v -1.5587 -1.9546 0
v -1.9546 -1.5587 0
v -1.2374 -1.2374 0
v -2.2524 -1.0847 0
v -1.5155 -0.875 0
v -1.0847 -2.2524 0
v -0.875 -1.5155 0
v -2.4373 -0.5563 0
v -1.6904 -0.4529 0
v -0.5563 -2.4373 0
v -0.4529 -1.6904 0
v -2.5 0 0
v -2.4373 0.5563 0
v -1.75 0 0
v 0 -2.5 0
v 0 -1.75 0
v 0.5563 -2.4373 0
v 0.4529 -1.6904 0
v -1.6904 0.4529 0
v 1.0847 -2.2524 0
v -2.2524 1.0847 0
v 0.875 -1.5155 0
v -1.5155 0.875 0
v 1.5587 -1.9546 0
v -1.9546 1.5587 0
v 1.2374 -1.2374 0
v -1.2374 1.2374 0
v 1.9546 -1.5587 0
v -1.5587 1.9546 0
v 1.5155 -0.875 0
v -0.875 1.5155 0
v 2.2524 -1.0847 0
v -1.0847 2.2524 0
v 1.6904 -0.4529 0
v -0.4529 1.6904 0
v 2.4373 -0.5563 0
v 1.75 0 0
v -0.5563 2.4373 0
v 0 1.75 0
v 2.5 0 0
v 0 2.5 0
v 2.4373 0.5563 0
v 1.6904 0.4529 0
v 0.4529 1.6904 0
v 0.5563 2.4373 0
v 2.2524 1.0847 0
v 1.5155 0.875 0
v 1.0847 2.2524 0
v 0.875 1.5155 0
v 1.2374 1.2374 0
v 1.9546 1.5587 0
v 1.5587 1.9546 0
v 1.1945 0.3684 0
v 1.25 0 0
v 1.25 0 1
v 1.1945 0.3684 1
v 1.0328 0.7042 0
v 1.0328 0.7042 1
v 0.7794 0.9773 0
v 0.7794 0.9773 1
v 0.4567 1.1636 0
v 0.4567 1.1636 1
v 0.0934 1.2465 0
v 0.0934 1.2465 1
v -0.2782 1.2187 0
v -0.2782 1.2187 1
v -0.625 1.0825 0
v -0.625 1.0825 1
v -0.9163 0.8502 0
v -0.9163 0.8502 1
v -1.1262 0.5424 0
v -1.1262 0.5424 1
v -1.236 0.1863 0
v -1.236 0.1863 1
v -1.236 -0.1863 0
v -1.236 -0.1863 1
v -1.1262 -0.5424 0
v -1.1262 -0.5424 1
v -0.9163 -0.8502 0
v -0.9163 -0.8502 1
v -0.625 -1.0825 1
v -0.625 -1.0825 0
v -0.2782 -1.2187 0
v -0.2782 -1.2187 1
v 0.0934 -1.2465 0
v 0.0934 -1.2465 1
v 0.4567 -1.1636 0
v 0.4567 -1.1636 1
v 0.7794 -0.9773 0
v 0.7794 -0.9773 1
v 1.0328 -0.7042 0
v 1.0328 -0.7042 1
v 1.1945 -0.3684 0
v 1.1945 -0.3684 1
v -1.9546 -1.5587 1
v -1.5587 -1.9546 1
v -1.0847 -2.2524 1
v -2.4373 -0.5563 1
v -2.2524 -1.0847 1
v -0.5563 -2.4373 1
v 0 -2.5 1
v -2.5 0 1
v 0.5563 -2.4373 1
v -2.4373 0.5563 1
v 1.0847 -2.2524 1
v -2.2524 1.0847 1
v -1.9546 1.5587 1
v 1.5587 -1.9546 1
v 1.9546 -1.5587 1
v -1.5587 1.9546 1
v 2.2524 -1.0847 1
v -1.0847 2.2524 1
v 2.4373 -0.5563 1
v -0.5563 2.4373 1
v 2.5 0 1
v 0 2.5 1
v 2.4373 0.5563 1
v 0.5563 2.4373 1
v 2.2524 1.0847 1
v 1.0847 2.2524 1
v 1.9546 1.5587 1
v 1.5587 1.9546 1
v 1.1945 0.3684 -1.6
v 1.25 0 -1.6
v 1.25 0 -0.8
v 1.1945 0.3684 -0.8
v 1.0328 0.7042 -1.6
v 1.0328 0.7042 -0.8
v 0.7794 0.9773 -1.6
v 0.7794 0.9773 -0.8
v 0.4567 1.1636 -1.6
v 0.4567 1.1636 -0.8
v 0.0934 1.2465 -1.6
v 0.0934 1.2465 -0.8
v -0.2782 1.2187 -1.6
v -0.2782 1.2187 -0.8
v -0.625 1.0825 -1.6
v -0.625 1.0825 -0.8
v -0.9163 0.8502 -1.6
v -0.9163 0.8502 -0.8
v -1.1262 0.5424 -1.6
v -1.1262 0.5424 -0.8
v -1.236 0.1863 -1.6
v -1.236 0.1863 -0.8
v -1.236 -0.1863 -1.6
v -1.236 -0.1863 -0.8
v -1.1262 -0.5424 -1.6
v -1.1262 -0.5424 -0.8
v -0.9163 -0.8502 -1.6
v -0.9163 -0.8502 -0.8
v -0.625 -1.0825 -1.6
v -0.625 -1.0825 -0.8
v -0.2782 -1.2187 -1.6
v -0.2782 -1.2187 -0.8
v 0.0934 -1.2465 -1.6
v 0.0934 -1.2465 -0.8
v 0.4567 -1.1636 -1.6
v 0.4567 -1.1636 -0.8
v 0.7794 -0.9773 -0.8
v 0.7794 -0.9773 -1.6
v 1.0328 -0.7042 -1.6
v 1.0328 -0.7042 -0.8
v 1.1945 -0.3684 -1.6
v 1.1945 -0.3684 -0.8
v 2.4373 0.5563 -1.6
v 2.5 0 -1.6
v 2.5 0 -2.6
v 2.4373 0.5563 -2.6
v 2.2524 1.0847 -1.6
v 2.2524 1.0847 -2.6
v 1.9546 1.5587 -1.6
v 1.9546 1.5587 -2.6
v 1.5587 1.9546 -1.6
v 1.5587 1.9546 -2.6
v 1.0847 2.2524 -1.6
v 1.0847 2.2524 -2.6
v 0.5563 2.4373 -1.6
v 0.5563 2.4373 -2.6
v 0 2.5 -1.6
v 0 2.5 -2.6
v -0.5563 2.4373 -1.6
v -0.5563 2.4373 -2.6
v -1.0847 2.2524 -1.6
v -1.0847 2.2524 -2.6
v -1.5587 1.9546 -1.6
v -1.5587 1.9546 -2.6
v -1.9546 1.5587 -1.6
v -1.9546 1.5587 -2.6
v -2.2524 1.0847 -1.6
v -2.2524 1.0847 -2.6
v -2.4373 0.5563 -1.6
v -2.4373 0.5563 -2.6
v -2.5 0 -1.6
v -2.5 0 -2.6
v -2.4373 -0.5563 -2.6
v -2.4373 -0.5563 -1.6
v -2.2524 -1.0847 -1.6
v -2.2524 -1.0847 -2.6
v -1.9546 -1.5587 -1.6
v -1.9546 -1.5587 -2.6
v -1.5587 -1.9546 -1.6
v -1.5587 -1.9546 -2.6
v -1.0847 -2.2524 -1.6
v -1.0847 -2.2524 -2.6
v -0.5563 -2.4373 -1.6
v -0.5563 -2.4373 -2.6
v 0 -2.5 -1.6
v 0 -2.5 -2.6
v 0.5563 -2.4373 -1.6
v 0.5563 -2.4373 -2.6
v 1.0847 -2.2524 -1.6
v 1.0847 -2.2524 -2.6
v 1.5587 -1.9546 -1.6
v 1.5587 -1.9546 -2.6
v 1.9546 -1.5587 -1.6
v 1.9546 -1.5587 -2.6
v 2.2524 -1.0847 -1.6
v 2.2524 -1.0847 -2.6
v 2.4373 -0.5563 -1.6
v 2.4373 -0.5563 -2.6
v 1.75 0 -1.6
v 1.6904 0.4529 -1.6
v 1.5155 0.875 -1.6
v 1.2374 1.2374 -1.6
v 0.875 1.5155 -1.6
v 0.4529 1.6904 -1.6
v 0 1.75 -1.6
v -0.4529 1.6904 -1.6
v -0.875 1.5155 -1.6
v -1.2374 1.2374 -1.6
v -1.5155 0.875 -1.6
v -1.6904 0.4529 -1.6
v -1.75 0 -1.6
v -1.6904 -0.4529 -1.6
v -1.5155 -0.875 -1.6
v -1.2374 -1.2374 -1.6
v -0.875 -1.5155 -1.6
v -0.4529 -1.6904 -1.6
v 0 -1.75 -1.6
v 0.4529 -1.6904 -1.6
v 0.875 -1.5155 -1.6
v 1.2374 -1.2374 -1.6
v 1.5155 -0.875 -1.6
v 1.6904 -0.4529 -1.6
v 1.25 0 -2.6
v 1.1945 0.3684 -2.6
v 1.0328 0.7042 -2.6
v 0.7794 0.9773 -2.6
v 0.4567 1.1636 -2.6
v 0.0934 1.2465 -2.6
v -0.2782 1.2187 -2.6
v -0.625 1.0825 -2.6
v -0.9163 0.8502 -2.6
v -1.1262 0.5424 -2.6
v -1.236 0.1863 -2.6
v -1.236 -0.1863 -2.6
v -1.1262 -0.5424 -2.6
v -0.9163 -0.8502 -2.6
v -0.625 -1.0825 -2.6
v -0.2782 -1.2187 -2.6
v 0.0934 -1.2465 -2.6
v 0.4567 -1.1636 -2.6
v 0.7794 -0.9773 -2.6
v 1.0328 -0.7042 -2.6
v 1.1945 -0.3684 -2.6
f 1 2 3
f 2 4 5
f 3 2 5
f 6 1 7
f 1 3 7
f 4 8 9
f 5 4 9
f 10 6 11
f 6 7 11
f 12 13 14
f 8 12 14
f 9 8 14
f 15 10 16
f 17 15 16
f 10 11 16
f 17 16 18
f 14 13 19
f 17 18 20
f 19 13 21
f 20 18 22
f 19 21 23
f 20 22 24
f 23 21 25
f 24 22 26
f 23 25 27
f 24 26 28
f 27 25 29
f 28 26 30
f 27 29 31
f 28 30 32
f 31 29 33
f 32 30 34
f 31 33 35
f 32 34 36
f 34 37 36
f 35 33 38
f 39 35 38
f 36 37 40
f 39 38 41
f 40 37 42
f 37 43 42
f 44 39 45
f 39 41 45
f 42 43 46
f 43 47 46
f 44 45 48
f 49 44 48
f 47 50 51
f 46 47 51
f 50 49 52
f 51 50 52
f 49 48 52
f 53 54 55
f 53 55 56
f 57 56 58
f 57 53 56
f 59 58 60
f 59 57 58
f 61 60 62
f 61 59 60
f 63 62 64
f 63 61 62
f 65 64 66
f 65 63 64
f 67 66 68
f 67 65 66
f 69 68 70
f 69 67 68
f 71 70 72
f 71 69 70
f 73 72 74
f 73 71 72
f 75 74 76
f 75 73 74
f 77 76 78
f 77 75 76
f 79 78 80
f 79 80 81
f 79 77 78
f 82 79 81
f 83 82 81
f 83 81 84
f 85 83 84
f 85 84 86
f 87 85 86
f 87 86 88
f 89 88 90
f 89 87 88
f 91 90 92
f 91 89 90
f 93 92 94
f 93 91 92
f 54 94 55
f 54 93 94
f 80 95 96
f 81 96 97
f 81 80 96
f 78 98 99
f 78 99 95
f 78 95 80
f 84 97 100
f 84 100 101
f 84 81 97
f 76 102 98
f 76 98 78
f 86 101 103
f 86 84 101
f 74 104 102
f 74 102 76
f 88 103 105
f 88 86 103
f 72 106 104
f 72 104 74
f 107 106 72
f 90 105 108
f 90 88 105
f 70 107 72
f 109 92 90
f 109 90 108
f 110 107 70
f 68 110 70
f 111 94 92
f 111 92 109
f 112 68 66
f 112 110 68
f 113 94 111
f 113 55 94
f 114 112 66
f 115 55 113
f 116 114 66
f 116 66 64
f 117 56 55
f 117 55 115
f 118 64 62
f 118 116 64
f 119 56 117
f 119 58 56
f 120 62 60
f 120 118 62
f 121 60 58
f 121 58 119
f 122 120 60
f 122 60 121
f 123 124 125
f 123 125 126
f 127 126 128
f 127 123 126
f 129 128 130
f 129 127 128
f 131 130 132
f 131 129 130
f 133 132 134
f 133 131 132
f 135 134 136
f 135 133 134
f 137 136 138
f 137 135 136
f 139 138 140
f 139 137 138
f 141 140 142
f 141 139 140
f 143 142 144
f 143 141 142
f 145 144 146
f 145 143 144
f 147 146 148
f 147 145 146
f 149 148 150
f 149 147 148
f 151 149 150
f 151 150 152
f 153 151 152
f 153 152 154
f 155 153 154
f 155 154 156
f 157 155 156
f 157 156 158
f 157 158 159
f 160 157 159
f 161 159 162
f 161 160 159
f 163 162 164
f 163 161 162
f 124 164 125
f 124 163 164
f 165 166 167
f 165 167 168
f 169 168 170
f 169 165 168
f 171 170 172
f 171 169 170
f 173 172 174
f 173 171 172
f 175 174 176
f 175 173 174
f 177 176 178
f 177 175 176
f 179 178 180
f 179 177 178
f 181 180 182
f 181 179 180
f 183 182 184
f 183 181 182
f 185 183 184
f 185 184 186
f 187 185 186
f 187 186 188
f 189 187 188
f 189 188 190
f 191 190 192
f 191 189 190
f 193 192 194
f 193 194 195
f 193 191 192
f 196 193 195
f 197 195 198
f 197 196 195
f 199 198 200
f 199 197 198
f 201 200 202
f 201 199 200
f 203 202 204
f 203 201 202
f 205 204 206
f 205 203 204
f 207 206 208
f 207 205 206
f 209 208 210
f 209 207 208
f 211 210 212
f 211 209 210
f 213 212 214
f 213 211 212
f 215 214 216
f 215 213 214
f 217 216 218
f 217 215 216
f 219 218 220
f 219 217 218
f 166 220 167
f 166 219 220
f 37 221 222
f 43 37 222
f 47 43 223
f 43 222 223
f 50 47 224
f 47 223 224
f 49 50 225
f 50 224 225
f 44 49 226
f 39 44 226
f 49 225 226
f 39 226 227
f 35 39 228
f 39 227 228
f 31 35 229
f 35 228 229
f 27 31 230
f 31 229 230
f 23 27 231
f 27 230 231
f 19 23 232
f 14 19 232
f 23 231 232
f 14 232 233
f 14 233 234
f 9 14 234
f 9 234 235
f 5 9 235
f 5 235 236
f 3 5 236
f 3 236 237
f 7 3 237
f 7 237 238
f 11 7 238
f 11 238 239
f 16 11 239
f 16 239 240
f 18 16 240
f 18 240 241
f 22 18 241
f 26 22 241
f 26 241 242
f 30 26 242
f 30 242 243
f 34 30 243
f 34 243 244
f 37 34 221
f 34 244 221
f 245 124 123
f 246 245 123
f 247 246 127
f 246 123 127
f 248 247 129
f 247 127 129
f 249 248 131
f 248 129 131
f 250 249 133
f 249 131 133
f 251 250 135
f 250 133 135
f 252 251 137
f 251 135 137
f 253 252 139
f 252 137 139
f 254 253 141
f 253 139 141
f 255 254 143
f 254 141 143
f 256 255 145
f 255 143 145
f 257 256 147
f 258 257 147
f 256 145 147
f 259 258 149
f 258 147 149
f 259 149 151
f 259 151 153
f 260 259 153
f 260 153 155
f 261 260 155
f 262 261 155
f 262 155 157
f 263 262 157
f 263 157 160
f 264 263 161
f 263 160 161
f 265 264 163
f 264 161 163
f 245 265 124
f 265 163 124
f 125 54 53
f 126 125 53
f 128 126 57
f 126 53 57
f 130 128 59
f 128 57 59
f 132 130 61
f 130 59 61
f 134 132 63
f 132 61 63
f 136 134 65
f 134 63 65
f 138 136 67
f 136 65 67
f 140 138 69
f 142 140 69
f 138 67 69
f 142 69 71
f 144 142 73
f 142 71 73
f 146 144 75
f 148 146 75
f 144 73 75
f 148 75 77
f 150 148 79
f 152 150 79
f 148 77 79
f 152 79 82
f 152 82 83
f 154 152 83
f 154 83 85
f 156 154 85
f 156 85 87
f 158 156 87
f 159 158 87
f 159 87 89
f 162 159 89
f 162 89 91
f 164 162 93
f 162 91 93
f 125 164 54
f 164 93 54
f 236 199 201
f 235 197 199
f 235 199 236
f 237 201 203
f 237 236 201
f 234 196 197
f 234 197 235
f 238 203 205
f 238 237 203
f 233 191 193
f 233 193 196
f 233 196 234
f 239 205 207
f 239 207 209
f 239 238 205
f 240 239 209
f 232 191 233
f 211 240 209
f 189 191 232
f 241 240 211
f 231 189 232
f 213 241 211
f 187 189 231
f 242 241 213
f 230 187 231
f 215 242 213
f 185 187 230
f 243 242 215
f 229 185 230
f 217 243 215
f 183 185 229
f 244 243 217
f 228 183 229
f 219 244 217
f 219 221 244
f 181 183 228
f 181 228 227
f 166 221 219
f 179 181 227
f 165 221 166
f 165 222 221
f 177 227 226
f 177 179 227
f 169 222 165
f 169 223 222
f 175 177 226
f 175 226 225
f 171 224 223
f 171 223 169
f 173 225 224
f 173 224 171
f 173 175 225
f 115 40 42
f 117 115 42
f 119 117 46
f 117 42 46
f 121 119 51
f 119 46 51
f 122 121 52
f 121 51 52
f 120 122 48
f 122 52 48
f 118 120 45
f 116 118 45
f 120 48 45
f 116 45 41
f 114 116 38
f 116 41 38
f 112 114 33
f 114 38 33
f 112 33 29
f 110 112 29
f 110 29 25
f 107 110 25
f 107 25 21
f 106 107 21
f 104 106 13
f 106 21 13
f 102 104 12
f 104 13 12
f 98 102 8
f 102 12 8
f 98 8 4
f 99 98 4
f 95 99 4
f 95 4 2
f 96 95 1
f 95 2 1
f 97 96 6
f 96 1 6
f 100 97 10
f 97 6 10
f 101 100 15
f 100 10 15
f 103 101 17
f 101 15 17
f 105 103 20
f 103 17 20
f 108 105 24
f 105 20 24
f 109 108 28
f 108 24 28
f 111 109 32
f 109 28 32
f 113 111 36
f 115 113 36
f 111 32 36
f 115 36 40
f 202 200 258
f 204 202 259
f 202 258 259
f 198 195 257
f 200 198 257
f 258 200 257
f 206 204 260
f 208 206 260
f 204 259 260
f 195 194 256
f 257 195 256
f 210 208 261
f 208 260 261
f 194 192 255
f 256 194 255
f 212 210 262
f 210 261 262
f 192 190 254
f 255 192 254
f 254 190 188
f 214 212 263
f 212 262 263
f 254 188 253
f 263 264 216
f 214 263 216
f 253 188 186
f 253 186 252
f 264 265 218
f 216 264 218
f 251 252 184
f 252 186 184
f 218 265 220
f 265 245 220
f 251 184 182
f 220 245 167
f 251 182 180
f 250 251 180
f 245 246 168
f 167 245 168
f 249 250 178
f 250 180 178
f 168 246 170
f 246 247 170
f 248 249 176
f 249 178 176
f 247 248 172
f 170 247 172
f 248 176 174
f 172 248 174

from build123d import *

# Parameters (mm, degrees)
F0_R     = 2.5
F0_R_2   = 1.75
F0_R_3   = 1.25
F1_DEPTH = 1
F2_DEPTH = 0.8


with BuildPart() as f1:
    # F0 (on Top) → F1 (new body)
    with BuildSketch(Plane.XY):
        Circle(F0_R)
        Circle(F0_R_2, mode=Mode.SUBTRACT)
        Circle(F0_R_2)
        Circle(F0_R_3, mode=Mode.SUBTRACT)
    extrude(amount=F1_DEPTH)

    # F0 (on Top) → F2 (join)
    with BuildSketch(Plane.XY):
        Circle(F0_R_2)
        Circle(F0_R_3, mode=Mode.SUBTRACT)
    extrude(amount=-F2_DEPTH)

    # F3: F1 across face


with BuildPart() as f1_1:
    add(f1.part)
    add(f1.part.mirror(Plane(origin=(0, 0, -0.8), x_dir=(1, 0, 0), z_dir=(0, 0, -1))))


solid = f1_1.part
